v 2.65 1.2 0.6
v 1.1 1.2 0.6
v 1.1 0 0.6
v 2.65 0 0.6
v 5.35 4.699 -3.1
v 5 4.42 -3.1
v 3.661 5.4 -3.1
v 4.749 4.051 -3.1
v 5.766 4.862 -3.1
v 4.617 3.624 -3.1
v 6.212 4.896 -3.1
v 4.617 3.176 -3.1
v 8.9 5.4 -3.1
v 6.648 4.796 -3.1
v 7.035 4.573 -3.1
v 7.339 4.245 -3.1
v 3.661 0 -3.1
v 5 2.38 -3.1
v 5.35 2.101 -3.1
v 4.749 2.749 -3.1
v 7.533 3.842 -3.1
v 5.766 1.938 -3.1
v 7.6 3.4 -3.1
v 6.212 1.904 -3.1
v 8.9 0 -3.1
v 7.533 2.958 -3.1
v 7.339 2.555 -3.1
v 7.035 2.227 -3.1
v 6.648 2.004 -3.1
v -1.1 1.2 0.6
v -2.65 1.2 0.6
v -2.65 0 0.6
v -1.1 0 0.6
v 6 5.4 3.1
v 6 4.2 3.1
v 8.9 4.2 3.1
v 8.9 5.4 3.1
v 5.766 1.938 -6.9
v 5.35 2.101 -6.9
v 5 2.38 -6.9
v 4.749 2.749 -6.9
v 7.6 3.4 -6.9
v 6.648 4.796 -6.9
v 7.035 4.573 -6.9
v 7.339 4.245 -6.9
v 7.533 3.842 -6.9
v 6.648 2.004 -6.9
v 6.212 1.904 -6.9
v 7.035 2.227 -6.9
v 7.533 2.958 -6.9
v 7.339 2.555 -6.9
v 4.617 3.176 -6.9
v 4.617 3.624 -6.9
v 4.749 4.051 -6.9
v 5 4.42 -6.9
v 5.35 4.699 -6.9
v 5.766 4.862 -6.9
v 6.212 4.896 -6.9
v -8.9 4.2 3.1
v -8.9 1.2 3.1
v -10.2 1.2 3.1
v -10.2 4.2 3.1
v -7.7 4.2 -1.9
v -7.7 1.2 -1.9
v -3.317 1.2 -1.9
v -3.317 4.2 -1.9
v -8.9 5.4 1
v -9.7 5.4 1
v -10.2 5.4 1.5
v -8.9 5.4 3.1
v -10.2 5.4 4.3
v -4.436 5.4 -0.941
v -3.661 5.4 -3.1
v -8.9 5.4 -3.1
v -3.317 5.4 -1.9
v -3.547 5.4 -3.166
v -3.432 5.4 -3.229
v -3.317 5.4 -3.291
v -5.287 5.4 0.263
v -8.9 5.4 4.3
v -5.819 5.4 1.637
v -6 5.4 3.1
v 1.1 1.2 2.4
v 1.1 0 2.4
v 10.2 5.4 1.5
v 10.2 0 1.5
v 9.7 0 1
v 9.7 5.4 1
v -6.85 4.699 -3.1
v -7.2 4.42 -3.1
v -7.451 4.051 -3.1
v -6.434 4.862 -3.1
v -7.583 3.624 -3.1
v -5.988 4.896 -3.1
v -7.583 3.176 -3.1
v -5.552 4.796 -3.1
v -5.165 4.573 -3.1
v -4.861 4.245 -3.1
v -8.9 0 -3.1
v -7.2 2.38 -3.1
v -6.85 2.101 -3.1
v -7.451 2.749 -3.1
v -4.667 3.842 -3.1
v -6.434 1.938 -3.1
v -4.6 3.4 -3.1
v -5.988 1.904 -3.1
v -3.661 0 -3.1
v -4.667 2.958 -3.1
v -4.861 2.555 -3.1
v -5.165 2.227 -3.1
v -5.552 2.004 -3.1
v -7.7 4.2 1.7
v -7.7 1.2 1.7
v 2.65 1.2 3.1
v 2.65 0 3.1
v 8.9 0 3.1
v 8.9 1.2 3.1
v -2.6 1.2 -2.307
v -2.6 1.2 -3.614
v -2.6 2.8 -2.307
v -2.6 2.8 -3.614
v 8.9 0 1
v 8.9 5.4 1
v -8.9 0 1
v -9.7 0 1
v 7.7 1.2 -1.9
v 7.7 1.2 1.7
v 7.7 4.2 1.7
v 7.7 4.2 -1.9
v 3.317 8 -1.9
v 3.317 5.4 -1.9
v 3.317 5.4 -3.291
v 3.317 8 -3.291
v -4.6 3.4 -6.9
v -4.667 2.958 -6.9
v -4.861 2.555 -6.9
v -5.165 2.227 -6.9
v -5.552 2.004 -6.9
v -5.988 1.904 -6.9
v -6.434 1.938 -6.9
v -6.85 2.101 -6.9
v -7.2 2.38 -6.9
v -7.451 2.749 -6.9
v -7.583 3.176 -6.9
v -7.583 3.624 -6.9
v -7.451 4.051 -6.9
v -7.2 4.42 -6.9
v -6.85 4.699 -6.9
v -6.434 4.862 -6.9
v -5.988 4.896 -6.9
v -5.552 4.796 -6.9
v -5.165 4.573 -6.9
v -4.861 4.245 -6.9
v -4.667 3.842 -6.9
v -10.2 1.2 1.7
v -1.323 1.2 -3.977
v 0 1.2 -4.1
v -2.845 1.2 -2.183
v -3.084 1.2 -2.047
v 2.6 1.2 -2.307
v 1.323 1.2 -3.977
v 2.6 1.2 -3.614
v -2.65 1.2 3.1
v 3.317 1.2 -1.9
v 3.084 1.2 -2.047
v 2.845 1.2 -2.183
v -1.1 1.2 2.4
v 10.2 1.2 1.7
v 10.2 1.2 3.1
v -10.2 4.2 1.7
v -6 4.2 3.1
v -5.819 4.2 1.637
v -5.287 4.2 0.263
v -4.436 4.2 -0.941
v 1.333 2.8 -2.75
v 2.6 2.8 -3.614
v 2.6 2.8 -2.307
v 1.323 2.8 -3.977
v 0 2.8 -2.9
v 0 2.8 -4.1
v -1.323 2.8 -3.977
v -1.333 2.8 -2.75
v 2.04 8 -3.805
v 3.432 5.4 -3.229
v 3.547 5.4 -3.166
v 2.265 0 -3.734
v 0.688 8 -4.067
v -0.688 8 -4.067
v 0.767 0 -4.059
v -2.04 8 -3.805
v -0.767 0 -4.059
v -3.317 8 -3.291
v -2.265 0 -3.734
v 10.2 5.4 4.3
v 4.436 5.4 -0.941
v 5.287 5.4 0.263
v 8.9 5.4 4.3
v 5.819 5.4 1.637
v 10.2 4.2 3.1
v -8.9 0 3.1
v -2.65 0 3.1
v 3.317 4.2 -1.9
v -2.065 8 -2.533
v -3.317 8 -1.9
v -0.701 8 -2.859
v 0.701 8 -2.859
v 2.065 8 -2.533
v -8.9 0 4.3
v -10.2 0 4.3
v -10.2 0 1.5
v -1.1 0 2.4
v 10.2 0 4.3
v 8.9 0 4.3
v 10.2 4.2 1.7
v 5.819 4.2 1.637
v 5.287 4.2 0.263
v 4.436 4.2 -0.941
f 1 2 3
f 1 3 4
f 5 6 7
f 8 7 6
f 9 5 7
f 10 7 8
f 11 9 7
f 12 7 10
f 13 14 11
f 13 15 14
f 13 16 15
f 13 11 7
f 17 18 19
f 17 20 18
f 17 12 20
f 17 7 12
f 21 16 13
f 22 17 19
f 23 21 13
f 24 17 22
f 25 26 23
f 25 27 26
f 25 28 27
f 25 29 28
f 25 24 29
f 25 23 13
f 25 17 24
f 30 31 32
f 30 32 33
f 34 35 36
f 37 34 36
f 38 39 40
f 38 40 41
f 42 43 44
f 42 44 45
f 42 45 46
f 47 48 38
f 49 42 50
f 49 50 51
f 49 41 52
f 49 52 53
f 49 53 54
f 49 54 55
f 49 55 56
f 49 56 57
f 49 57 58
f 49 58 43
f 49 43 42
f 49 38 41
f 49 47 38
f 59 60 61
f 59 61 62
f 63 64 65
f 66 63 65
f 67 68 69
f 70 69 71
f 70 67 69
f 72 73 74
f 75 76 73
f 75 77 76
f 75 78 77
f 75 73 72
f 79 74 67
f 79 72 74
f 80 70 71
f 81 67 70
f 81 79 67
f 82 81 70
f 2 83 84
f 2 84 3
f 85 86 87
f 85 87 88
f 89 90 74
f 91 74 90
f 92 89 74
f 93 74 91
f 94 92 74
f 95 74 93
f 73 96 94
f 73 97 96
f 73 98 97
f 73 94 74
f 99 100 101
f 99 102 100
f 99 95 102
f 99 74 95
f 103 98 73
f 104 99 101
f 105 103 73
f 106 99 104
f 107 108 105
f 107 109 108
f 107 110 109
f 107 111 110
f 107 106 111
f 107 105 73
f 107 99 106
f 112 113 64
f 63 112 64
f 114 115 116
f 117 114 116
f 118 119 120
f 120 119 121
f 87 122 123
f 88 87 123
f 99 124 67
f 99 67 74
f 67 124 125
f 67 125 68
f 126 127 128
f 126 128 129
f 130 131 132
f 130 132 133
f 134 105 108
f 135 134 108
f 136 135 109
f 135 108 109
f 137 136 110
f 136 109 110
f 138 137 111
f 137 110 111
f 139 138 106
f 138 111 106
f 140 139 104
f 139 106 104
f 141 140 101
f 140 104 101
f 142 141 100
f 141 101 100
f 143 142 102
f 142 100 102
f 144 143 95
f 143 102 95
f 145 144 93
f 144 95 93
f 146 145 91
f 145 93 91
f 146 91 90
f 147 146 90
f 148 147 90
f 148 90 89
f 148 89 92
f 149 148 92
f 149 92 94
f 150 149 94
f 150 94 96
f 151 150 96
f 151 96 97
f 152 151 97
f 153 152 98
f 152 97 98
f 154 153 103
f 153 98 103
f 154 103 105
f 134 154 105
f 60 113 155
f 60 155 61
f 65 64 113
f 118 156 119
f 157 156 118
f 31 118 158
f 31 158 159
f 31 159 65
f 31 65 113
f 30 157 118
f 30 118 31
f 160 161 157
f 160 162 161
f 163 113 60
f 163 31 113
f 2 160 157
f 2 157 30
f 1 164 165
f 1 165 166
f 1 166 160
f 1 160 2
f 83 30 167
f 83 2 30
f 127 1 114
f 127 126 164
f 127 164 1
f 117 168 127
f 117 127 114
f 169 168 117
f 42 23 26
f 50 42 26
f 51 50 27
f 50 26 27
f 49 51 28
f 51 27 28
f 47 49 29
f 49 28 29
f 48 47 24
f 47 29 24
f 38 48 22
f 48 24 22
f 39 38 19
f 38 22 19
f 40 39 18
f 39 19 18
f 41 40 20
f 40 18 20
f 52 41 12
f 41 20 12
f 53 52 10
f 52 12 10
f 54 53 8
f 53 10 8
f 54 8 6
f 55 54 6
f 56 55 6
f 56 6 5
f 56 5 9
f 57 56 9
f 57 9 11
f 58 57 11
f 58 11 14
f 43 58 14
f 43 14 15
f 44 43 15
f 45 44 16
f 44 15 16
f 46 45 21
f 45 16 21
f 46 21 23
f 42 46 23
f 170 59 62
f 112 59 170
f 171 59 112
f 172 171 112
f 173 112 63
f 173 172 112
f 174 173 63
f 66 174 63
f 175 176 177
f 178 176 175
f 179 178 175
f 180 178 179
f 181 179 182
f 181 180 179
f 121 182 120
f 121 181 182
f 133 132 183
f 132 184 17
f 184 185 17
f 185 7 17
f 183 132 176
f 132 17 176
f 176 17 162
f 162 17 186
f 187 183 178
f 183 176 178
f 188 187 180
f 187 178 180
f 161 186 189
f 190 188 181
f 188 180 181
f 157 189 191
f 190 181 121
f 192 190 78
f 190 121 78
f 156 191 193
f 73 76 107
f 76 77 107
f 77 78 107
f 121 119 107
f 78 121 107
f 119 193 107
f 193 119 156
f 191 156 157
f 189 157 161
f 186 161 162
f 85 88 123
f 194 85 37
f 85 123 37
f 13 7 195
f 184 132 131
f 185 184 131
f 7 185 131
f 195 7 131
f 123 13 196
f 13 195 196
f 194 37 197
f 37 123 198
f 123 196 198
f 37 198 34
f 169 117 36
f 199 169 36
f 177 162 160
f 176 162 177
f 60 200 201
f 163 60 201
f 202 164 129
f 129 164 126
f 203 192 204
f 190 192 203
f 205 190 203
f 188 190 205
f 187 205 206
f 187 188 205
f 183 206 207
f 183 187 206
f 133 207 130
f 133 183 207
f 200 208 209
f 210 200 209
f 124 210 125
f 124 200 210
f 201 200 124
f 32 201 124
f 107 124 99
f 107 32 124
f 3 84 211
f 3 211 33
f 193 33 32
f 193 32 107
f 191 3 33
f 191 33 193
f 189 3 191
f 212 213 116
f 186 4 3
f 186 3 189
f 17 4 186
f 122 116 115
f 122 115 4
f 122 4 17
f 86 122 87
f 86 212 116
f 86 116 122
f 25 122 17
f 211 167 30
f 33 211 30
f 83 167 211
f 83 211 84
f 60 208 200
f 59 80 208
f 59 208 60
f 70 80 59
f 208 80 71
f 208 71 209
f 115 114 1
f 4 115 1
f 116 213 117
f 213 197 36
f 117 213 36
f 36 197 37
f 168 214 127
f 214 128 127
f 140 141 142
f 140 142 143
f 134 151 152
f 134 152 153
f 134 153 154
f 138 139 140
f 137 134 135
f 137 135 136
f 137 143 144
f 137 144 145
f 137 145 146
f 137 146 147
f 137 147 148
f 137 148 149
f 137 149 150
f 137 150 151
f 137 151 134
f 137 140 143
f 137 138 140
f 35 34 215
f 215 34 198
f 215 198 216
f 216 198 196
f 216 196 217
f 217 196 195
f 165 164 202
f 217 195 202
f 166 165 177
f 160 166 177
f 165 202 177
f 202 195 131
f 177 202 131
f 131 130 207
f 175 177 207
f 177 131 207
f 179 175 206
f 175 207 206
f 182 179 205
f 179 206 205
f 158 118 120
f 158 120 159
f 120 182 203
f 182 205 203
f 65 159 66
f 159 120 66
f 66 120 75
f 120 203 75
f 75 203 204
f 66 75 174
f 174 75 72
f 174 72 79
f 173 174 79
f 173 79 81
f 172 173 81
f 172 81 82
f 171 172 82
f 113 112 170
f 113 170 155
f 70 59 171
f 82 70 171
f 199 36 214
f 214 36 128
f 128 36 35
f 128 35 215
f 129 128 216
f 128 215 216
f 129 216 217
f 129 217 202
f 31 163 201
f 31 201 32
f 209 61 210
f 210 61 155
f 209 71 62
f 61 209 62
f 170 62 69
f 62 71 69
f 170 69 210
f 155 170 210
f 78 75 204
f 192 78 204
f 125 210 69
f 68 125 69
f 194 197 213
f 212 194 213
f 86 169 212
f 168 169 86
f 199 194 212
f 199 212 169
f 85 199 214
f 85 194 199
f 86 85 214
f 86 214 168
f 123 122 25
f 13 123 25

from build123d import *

# Parameters (mm, degrees)
SKETCH1_W                = 17.8
SKETCH1_H                = 6.2
BOSS_EXTRUDE1_DEPTH      = 5.4
SHELL1_T                 = -1.2
SKETCH2_W                = 6
SKETCH2_H                = 4.2
REVOLVE1_DEPTH           = 8
SKETCH5_W                = 1.864108749
SKETCH5_H                = 2.6
CUT_EXTRUDE1_DEPTH       = 5.4
SKETCH6_W                = 5.2
SKETCH6_H                = 1.6
CUT_EXTRUDE2_DEPTH       = 2.7
SKETCH7_R                = 1.5
BOSS_EXTRUDE2_DEPTH      = 3.8
SKETCH9_W                = 5.3
SKETCH9_H                = 2.5
CUT_EXTRUDE3_DEPTH       = 5
SKETCH12_W               = 1.4
SKETCH12_H               = 3
CUT_EXTRUDE4_DEPTH       = 5
BOSS_EXTRUDE5_DEPTH      = 1.3
CHAMFER1_SIZE            = 0.5
CHAMFER1_OF_MIRROR1_SIZE = 0.5
SKETCH13_W               = 2.2
SKETCH13_H               = 1.8
BOSS_EXTRUDE6_DEPTH      = 1.2


# Read off the part's stored shape, not the designer's step: Revolve1
with BuildPart() as part:
    # Sketch1 → Boss-Extrude1 (new body)
    with BuildSketch(Plane(origin=(0, 0, 0), x_dir=(1, 0, 0), z_dir=(0, 1, 0))):
        Rectangle(SKETCH1_W, SKETCH1_H)
    extrude(amount=BOSS_EXTRUDE1_DEPTH)

    # Shell1
    shell1_openings = [part.faces().sort_by_distance(p)[0] for p in [
        (0, 2.7, 3.1),
    ]]
    offset(amount=SHELL1_T, openings=shell1_openings, kind=Kind.INTERSECTION)

    # Sketch2 → Cut-Revolve1 (revolve, cut)
    with BuildSketch(Plane.XY.offset(3.1)):
        with Locations((3, 3.3)):
            Rectangle(SKETCH2_W, SKETCH2_H)
    revolve(axis=Axis((0, 1.2, 3.1), (0, 1, 0)), mode=Mode.SUBTRACT)

    # Revolve1 outline → Revolve1 (add)
    with BuildSketch(Plane(origin=(0, 0, 0), x_dir=(1, 0, 0), z_dir=(0, 1, 0))):
        with BuildLine():
            Line((-5.180733539, 1.9), (-3.31662479, 1.9))
            ThreePointArc((-3.31662479, 1.9), (0, 2.9), (3.31662479, 1.9))
            Line((3.31662479, 1.9), (5.180733539, 1.9))
            ThreePointArc((5.180733539, 1.9), (0, 4.1), (-5.180733539, 1.9))
        make_face()
    extrude(amount=REVOLVE1_DEPTH)

    # Sketch5 → Cut-Extrude1 (cut)
    with BuildSketch(Plane.XY.offset(-1.9)):
        with Locations((-4.248679165, 6.7)):
            Rectangle(SKETCH5_W, SKETCH5_H)
        with Locations((4.248679165, 6.7)):
            Rectangle(SKETCH5_W, SKETCH5_H)
    extrude(amount=-CUT_EXTRUDE1_DEPTH, mode=Mode.SUBTRACT)

    # Sketch6 → Cut-Extrude2 (cut, symmetric)
    with BuildSketch(Plane(origin=(0, 0, -3.1), x_dir=(-1, 0, 0), z_dir=(0, 0, -1))):
        with Locations((0, 2)):
            Rectangle(SKETCH6_W, SKETCH6_H)
    extrude(amount=CUT_EXTRUDE2_DEPTH, both=True, mode=Mode.SUBTRACT)

    # Sketch7 → Boss-Extrude2 (add)
    with BuildSketch(Plane(origin=(0, 0, -3.1), x_dir=(-1, 0, 0), z_dir=(0, 0, -1))):
        with Locations(Location((6.1, 3.4, 0), (0, 0, 180))):
            Circle(SKETCH7_R)
        with Locations(Location((-6.1, 3.4, 0), (0, 0, 180))):
            Circle(SKETCH7_R)
    extrude(amount=BOSS_EXTRUDE2_DEPTH)

    # Sketch9 → Cut-Extrude3 (cut, symmetric)
    with BuildSketch(Plane(origin=(0, 1.2, 0), x_dir=(1, 0, 0), z_dir=(0, 1, 0))):
        with Locations((0, -1.85)):
            Rectangle(SKETCH9_W, SKETCH9_H)
    extrude(amount=CUT_EXTRUDE3_DEPTH, both=True, mode=Mode.SUBTRACT)

    # Sketch12 → Cut-Extrude4 (cut, symmetric)
    with BuildSketch(Plane(origin=(8.9, 0, 0), x_dir=(0, 0, -1), z_dir=(1, 0, 0))):
        with Locations((-2.4, 2.7)):
            Rectangle(SKETCH12_W, SKETCH12_H)
    cut_extrude4 = extrude(amount=CUT_EXTRUDE4_DEPTH, both=True, mode=Mode.SUBTRACT)

    # Sketch11 → Boss-Extrude5 (add)
    with BuildSketch(Plane(origin=(8.9, 0, 0), x_dir=(0, 0, -1), z_dir=(1, 0, 0))):
        Polygon((-1, 0), (-1, 5.4), (-3.1, 5.4), (-3.1, 4.2), (-1.7, 4.2), (-1.7, 1.2), (-3.1, 1.2), (-3.1, 0), align=None)
        Polygon((-3.1, 4.2), (-3.1, 5.4), (-4.3, 5.4), (-4.3, 0), (-3.1, 0), (-3.1, 1.2), align=None)
    boss_extrude5 = extrude(amount=BOSS_EXTRUDE5_DEPTH)

    # Chamfer1
    chamfer1_edges = [part.edges().sort_by_distance(p)[0] for p in [
        (10.2, 2.7, 1),
    ]]
    chamfer(chamfer1_edges, length=CHAMFER1_SIZE)

    # Mirror1: Cut-Extrude4, Boss-Extrude5 across plane
    add(cut_extrude4.mirror(Plane(origin=(0, 0, 0), x_dir=(0, 0, 1), z_dir=(1, 0, 0))), mode=Mode.SUBTRACT)
    add(boss_extrude5.mirror(Plane(origin=(0, 0, 0), x_dir=(0, 0, 1), z_dir=(1, 0, 0))))

    # Chamfer1 of Mirror1
    chamfer1_of_mirror1_edges = [part.edges().sort_by_distance(p)[0] for p in [
        (-10.2, 2.7, 1),
    ]]
    chamfer(chamfer1_of_mirror1_edges, length=CHAMFER1_OF_MIRROR1_SIZE)

    # Sketch13 → Boss-Extrude6 (add)
    with BuildSketch(Plane(origin=(0, 1.2, 0), x_dir=(1, 0, 0), z_dir=(0, 1, 0))):
        with Locations((0, -1.5)):
            Rectangle(SKETCH13_W, SKETCH13_H)
    extrude(amount=-BOSS_EXTRUDE6_DEPTH)


solid = part.part
